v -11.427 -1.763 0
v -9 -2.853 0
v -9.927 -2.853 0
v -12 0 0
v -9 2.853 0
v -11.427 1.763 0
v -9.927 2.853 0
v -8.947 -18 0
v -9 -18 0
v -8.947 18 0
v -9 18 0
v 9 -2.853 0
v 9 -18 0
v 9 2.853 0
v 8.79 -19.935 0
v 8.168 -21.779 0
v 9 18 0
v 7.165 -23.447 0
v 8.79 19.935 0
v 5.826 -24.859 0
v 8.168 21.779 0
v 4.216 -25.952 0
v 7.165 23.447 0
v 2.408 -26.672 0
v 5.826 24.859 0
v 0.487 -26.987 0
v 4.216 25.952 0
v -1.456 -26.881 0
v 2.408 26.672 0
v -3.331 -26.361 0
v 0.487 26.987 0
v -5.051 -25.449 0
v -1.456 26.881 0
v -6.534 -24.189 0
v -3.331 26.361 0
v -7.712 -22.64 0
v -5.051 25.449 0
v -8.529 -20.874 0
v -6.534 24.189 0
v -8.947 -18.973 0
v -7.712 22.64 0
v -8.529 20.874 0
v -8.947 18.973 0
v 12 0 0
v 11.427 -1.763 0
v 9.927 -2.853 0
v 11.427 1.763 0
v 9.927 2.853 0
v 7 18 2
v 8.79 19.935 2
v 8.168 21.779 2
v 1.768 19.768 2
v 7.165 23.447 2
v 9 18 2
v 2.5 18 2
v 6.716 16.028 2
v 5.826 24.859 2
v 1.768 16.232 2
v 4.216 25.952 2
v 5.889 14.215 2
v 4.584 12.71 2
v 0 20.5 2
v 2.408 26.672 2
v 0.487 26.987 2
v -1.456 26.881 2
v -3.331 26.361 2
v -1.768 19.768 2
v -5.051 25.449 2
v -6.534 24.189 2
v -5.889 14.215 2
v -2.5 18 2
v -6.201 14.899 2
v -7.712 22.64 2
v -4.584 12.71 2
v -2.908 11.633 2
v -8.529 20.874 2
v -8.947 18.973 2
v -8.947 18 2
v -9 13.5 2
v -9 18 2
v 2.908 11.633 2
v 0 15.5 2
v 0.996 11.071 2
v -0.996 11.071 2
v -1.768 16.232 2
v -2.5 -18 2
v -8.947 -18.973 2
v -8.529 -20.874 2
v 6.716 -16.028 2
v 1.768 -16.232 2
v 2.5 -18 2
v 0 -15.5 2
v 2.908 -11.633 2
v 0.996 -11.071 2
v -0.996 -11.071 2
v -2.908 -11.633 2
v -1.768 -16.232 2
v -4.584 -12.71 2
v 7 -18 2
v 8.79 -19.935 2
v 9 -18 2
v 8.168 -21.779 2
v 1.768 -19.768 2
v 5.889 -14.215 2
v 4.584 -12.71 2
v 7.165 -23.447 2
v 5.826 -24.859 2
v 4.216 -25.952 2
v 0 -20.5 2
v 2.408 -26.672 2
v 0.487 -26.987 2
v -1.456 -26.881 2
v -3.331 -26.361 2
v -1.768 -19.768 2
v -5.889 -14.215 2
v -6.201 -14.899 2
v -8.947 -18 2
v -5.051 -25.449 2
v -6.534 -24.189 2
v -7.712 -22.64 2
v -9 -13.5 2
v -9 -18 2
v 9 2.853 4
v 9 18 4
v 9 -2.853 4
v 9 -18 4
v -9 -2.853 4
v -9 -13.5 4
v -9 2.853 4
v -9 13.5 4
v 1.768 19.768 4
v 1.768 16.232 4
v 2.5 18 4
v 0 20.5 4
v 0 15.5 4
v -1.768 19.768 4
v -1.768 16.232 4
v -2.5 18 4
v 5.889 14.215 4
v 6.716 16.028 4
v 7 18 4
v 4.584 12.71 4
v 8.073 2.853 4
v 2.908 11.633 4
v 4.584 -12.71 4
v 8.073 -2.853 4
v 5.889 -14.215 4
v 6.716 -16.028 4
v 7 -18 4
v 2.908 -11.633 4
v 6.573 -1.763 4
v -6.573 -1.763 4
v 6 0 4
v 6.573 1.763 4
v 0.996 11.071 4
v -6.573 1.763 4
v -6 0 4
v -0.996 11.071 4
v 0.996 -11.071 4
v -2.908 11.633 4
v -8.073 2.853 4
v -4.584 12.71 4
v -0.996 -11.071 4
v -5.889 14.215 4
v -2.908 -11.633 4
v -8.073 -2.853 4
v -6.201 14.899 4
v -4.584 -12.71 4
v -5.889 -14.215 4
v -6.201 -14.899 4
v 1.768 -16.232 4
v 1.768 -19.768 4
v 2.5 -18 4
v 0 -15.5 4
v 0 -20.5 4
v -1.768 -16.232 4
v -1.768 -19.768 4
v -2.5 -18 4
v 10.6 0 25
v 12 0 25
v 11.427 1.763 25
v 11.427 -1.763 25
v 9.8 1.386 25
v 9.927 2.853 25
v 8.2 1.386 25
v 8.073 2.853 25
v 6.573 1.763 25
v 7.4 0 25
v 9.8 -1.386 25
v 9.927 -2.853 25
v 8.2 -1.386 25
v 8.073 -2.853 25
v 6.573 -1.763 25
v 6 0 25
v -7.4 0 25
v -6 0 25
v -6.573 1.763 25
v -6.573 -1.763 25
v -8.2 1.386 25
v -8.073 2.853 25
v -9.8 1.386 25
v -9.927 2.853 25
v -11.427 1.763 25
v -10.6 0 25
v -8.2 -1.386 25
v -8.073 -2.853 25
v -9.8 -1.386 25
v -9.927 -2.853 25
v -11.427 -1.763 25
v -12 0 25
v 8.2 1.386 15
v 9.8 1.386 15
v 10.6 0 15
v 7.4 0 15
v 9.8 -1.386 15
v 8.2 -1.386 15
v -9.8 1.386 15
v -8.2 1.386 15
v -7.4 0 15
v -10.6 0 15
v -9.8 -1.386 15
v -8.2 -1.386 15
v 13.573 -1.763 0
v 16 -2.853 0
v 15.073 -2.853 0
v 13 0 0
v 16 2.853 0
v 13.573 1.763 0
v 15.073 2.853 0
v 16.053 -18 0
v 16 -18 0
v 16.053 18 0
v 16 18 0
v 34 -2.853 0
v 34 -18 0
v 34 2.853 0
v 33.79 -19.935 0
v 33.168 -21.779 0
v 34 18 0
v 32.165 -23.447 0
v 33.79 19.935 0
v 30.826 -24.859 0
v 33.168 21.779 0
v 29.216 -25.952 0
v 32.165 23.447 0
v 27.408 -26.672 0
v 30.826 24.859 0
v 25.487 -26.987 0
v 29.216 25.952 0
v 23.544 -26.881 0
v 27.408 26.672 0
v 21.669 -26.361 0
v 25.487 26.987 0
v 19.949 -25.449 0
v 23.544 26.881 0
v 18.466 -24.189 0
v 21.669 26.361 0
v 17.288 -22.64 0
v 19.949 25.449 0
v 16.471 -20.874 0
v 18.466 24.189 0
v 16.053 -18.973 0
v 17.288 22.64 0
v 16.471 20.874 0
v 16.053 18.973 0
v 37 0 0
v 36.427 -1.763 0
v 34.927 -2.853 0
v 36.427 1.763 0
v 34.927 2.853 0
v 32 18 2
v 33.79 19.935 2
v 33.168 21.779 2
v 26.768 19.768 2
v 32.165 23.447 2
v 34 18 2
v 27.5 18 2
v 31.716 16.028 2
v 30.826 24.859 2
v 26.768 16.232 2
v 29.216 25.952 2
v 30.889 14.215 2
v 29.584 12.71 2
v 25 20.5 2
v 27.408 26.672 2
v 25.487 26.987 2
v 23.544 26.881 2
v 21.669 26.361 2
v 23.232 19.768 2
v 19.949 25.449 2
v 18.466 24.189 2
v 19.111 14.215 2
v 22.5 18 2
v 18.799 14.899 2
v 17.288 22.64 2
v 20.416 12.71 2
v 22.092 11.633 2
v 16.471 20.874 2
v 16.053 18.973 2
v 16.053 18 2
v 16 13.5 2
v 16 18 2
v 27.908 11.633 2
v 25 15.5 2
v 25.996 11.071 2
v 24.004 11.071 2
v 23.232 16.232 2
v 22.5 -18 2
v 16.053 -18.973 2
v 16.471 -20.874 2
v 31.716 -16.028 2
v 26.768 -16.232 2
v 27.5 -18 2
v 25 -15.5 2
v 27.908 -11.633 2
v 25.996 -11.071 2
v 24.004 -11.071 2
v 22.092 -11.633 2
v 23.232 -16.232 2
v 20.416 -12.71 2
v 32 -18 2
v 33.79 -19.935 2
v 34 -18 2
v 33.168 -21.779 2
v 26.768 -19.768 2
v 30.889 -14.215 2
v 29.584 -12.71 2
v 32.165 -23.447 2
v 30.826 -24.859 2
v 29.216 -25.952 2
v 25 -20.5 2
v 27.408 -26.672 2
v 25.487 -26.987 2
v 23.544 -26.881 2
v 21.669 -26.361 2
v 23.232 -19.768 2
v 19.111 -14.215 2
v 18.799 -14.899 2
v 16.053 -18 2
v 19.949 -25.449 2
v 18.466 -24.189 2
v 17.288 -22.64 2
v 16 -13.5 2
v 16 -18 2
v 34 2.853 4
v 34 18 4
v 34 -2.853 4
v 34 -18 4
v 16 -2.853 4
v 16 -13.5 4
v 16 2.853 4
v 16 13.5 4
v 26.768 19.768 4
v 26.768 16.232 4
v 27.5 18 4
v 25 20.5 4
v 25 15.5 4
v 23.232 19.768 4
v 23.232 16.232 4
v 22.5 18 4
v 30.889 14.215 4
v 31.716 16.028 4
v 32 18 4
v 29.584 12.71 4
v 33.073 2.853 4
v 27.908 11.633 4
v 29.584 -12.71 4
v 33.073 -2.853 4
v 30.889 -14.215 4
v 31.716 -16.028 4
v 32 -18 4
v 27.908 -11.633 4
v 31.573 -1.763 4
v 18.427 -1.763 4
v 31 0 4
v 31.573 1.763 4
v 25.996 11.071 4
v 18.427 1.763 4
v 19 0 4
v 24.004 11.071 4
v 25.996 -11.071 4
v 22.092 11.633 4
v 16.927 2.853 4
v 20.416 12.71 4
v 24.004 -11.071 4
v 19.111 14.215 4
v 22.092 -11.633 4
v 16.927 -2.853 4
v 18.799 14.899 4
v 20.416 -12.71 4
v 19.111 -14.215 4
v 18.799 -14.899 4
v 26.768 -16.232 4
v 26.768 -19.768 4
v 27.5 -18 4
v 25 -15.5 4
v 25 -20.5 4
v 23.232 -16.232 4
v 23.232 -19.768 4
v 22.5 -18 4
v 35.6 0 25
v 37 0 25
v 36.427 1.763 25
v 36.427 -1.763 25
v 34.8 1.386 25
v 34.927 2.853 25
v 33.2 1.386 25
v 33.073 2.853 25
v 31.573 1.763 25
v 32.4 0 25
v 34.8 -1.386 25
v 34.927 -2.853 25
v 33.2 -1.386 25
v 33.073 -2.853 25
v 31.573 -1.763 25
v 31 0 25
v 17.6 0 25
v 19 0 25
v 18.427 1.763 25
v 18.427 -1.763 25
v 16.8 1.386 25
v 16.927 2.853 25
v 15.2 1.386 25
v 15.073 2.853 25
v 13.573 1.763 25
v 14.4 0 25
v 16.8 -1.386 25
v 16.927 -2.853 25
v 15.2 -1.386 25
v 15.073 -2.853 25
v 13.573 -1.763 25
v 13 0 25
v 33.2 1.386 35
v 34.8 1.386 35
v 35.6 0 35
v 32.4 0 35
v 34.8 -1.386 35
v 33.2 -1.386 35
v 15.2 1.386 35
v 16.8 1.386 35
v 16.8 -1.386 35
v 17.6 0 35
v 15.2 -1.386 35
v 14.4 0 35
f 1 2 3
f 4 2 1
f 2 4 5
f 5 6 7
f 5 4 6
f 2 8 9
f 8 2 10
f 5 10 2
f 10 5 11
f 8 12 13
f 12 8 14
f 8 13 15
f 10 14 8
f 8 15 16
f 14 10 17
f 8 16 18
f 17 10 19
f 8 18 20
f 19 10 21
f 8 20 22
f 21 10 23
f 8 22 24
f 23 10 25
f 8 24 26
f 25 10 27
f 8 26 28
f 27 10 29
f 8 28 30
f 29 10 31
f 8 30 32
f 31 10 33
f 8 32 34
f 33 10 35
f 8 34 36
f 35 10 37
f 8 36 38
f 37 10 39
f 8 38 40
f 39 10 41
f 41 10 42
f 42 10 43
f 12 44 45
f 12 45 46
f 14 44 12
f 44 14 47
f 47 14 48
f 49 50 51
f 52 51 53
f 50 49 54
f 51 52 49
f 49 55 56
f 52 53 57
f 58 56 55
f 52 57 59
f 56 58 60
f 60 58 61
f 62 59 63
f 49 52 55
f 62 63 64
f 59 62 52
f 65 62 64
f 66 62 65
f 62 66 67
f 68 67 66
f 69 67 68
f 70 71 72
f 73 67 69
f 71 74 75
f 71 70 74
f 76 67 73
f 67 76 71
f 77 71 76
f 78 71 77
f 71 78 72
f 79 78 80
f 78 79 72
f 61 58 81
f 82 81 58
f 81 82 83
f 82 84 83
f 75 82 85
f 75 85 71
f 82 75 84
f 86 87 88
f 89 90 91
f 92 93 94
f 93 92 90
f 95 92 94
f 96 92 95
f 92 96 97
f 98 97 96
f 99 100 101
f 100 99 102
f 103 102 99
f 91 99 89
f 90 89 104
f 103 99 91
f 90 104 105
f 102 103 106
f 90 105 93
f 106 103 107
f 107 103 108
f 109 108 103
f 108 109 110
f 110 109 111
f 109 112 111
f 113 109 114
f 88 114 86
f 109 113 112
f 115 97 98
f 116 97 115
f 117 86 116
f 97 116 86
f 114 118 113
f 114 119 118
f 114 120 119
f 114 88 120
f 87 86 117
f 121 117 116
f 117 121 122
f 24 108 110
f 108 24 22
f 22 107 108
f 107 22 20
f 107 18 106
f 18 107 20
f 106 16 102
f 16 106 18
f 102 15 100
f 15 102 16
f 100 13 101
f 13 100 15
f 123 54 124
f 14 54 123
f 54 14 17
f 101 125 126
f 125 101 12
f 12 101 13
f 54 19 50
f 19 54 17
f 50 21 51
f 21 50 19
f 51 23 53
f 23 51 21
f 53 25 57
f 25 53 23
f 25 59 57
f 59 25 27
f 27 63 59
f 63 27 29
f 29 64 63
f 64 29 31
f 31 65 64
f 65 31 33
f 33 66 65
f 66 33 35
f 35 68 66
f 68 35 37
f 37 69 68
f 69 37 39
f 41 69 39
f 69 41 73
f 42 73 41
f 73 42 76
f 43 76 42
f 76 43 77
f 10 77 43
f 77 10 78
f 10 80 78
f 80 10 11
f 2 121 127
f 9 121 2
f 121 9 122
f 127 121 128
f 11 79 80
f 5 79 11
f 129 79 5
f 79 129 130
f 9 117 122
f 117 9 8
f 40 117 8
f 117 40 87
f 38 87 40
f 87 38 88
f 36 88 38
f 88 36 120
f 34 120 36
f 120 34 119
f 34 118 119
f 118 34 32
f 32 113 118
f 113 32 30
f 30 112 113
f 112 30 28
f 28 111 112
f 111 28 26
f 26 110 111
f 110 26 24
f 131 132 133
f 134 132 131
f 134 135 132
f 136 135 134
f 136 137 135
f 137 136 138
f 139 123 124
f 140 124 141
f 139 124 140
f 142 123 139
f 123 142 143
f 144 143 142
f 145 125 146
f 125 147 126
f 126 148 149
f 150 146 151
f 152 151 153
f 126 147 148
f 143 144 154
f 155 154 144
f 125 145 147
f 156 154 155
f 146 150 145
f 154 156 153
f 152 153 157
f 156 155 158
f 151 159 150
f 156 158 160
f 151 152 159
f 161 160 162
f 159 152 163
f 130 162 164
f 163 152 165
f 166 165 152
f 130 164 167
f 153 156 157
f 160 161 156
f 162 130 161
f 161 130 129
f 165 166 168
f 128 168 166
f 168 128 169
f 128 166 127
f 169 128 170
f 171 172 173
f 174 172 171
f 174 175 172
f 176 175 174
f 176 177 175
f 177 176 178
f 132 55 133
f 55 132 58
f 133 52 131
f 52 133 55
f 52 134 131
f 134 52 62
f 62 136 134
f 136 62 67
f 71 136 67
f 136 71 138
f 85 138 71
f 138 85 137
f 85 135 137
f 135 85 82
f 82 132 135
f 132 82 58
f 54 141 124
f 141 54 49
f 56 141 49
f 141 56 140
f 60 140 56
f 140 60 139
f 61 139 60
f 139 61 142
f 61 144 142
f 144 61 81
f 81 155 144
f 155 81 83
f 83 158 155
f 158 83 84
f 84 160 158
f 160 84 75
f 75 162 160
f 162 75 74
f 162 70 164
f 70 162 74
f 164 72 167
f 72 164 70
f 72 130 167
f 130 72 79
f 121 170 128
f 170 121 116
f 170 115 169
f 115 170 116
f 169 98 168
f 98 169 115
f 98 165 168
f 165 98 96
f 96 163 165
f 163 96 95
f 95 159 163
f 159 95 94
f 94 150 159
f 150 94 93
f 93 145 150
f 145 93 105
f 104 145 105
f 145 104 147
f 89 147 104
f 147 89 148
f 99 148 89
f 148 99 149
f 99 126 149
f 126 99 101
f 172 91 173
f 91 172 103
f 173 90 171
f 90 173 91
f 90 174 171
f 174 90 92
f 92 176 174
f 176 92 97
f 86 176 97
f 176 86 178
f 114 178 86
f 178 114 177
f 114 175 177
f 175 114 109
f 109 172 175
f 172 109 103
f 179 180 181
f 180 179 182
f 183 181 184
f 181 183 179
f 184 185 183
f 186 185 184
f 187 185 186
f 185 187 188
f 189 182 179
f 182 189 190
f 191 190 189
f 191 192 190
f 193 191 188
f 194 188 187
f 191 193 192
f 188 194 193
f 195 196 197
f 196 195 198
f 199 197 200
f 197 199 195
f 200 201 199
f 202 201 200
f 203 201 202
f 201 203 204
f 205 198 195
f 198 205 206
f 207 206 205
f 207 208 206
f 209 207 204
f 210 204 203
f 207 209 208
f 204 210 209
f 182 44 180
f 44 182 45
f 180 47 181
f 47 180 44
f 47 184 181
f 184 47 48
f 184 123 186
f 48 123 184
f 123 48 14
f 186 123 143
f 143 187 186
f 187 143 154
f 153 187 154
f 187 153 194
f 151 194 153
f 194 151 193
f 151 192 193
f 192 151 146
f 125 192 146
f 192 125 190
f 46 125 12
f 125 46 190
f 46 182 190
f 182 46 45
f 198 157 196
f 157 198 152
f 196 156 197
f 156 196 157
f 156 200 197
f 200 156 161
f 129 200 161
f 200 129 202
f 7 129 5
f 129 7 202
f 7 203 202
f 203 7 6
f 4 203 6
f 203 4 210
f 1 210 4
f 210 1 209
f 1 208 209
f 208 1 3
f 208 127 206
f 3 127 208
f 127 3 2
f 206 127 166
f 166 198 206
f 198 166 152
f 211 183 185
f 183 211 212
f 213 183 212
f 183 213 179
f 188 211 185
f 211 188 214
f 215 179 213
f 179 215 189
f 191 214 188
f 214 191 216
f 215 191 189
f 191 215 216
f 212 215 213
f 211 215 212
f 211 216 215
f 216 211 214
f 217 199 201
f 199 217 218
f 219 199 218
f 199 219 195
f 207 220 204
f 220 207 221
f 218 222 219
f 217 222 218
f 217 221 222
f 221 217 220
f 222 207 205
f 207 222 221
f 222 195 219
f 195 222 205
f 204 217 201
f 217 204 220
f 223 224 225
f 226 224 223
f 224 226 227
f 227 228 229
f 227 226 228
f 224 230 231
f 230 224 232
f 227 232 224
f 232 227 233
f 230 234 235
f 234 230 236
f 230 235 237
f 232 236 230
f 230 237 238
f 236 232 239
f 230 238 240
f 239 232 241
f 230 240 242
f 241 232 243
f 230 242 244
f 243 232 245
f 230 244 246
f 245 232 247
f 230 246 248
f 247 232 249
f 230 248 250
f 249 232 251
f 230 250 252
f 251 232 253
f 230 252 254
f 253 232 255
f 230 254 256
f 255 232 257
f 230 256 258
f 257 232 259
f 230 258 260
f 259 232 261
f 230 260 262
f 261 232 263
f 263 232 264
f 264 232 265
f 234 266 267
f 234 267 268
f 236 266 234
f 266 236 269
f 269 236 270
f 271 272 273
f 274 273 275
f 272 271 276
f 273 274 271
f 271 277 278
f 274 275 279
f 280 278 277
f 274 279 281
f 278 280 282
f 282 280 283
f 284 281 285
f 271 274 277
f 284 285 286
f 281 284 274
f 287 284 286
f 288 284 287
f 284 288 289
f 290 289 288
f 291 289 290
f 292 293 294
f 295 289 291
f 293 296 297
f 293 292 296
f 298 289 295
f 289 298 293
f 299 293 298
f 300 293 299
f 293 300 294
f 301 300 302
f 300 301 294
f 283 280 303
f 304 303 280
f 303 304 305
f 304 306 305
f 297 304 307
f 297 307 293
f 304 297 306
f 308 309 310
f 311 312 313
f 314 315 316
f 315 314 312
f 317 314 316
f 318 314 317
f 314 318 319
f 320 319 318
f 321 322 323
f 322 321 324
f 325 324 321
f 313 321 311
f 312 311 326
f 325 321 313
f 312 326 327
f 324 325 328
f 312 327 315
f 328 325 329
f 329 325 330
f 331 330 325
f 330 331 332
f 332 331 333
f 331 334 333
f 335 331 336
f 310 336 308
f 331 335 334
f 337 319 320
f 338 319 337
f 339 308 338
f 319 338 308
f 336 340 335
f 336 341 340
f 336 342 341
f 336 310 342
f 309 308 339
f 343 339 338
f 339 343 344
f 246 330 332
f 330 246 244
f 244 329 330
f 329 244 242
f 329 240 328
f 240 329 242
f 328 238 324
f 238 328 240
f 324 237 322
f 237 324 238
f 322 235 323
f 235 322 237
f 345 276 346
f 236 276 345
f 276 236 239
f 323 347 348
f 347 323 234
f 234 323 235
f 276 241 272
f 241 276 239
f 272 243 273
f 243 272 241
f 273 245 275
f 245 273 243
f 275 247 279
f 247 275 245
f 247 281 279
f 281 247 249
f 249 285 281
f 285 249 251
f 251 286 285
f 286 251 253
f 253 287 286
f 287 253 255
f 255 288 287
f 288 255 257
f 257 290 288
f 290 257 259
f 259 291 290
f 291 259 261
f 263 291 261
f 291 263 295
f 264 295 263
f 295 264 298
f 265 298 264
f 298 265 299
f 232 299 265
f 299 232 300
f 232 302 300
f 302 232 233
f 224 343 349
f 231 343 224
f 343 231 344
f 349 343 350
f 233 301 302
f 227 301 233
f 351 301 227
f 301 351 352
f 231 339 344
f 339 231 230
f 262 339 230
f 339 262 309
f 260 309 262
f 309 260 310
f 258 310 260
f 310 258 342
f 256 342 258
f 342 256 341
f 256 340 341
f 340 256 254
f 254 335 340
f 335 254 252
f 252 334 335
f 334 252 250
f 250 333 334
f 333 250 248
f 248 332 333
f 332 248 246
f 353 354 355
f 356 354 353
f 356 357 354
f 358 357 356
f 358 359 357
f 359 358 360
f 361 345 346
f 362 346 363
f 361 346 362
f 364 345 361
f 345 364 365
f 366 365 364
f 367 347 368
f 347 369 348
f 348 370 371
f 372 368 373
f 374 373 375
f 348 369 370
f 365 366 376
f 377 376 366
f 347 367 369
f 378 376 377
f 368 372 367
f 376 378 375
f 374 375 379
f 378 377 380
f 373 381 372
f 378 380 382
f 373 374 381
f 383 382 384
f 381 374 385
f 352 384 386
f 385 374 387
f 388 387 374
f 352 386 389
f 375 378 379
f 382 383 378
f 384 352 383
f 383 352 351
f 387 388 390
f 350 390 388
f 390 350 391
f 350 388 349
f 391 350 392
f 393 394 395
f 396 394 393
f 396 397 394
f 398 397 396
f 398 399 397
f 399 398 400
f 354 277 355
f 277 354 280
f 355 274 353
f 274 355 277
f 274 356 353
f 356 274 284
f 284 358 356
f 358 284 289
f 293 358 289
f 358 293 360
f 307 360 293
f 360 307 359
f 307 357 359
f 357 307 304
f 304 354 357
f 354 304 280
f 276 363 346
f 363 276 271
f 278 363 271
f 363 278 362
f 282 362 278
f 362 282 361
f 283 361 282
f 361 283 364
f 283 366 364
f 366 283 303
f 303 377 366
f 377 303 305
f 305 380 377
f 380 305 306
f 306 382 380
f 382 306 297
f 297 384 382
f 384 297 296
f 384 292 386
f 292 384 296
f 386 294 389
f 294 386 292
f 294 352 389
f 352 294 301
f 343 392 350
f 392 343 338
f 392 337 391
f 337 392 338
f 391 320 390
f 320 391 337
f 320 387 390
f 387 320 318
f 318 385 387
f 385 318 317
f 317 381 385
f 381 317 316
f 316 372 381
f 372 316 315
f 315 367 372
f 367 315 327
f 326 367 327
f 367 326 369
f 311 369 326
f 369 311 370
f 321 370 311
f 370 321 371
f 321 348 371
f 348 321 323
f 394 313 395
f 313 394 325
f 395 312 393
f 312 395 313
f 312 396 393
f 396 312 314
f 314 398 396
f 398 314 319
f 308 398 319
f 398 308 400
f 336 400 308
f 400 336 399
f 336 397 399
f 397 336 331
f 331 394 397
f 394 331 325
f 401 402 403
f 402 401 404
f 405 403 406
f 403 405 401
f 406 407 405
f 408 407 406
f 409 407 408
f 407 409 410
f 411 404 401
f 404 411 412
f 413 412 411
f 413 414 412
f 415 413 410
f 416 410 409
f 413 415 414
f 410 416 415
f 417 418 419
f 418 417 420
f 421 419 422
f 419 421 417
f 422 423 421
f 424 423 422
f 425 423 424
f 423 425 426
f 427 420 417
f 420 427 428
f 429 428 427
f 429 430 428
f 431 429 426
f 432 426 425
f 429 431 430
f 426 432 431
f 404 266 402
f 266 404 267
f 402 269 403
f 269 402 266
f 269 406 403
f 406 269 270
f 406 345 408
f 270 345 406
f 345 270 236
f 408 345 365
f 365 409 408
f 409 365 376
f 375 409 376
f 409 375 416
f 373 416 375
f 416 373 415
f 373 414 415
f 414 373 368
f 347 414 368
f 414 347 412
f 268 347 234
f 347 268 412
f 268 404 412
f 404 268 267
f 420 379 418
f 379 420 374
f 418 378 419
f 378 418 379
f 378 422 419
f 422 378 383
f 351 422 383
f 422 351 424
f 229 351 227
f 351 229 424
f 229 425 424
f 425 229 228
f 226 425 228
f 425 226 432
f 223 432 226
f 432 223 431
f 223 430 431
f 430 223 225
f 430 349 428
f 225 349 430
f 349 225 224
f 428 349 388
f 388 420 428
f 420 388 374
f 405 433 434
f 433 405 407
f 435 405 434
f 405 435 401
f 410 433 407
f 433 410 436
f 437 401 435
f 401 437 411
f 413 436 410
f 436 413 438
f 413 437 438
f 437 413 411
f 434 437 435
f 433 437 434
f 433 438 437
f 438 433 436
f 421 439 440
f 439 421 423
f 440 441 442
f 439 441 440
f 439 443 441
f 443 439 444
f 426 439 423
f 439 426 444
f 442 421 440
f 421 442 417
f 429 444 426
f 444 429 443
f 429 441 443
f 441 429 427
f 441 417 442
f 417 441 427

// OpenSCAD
height = 12;
width = 50;
link_pivot_angle1 = 0;
link_pivot_angle2 = 45;
tight_clearance = 0.2;



arm_dia = 6;
arm_pin_length = 10;
wall_thickness = 2;
center_dia = 5;




link_width = height + arm_dia;
link_length = link_width * 2;//2 radius ends 0.5w each plus 2w between axes
lesser_dia = link_width - 2*wall_thickness;



link_external_wHole();

translate ([link_width + arm_dia + 1,0])
link_external_wPin ();


module link_external_wPin () {
union () {
link ();
arm_pin(0);
mirror([1,0])
arm_pin(0);
}
}

module link_external_wHole () {
difference () {
link ();
arm_pin(1);
mirror([1,0])
arm_pin(1);
}
}

module arm_pins (shape) {
    arm_pin(shape);
    mirror([1,0])
    arm_pin(shape);
}

module arm_pin (shape){/*0- pin, 1 - hole*/
translate ([0,0,width/2-shape*arm_pin_length])
linear_extrude(arm_pin_length)
translate ([link_width/2,0])
circle(d=arm_dia/2+tight_clearance);
}


/*translate ([0,0,width/2])
linear_extrude(arm_pin_length)
translate ([link_width/2,0])
circle(d=arm_dia/2+tight_clearance);
*/

module link () {
linear_extrude(wall_thickness)
base ();
translate([0,0,wall_thickness])
linear_extrude(wall_thickness)
union () {
intersection () {
difference () {
base ();
translate ([0,link_width])
circle(d=lesser_dia);
translate ([0,-link_width])
circle(d=lesser_dia);
}

union () {
pivot_cutout ();
mirror ([0,1])
pivot_cutout ();
}
}

translate([0,link_width])
circle(d=center_dia);
translate([0,-link_width])
circle(d=center_dia);
}

linear_extrude(width*0.5)
union() {
translate([link_width*0.5,0])
circle(d=arm_dia);
translate([-link_width*0.5,0])
circle(d=arm_dia);
}
}

module base () {
union () {
square([link_width,link_length],true);
translate ([0,link_width])
    circle(d=link_width);
translate ([0,-link_width])
    circle(d=link_width);
}
}

//defines angles joints would pivot
module pivot_cutout () {
polygon(points = [[link_width,link_width-link_width/2*tan(link_pivot_angle1)],[0,link_width],[-link_width,link_width-link_width/2*tan(link_pivot_angle2)],[-link_width,0],[link_width,0]]);
}
